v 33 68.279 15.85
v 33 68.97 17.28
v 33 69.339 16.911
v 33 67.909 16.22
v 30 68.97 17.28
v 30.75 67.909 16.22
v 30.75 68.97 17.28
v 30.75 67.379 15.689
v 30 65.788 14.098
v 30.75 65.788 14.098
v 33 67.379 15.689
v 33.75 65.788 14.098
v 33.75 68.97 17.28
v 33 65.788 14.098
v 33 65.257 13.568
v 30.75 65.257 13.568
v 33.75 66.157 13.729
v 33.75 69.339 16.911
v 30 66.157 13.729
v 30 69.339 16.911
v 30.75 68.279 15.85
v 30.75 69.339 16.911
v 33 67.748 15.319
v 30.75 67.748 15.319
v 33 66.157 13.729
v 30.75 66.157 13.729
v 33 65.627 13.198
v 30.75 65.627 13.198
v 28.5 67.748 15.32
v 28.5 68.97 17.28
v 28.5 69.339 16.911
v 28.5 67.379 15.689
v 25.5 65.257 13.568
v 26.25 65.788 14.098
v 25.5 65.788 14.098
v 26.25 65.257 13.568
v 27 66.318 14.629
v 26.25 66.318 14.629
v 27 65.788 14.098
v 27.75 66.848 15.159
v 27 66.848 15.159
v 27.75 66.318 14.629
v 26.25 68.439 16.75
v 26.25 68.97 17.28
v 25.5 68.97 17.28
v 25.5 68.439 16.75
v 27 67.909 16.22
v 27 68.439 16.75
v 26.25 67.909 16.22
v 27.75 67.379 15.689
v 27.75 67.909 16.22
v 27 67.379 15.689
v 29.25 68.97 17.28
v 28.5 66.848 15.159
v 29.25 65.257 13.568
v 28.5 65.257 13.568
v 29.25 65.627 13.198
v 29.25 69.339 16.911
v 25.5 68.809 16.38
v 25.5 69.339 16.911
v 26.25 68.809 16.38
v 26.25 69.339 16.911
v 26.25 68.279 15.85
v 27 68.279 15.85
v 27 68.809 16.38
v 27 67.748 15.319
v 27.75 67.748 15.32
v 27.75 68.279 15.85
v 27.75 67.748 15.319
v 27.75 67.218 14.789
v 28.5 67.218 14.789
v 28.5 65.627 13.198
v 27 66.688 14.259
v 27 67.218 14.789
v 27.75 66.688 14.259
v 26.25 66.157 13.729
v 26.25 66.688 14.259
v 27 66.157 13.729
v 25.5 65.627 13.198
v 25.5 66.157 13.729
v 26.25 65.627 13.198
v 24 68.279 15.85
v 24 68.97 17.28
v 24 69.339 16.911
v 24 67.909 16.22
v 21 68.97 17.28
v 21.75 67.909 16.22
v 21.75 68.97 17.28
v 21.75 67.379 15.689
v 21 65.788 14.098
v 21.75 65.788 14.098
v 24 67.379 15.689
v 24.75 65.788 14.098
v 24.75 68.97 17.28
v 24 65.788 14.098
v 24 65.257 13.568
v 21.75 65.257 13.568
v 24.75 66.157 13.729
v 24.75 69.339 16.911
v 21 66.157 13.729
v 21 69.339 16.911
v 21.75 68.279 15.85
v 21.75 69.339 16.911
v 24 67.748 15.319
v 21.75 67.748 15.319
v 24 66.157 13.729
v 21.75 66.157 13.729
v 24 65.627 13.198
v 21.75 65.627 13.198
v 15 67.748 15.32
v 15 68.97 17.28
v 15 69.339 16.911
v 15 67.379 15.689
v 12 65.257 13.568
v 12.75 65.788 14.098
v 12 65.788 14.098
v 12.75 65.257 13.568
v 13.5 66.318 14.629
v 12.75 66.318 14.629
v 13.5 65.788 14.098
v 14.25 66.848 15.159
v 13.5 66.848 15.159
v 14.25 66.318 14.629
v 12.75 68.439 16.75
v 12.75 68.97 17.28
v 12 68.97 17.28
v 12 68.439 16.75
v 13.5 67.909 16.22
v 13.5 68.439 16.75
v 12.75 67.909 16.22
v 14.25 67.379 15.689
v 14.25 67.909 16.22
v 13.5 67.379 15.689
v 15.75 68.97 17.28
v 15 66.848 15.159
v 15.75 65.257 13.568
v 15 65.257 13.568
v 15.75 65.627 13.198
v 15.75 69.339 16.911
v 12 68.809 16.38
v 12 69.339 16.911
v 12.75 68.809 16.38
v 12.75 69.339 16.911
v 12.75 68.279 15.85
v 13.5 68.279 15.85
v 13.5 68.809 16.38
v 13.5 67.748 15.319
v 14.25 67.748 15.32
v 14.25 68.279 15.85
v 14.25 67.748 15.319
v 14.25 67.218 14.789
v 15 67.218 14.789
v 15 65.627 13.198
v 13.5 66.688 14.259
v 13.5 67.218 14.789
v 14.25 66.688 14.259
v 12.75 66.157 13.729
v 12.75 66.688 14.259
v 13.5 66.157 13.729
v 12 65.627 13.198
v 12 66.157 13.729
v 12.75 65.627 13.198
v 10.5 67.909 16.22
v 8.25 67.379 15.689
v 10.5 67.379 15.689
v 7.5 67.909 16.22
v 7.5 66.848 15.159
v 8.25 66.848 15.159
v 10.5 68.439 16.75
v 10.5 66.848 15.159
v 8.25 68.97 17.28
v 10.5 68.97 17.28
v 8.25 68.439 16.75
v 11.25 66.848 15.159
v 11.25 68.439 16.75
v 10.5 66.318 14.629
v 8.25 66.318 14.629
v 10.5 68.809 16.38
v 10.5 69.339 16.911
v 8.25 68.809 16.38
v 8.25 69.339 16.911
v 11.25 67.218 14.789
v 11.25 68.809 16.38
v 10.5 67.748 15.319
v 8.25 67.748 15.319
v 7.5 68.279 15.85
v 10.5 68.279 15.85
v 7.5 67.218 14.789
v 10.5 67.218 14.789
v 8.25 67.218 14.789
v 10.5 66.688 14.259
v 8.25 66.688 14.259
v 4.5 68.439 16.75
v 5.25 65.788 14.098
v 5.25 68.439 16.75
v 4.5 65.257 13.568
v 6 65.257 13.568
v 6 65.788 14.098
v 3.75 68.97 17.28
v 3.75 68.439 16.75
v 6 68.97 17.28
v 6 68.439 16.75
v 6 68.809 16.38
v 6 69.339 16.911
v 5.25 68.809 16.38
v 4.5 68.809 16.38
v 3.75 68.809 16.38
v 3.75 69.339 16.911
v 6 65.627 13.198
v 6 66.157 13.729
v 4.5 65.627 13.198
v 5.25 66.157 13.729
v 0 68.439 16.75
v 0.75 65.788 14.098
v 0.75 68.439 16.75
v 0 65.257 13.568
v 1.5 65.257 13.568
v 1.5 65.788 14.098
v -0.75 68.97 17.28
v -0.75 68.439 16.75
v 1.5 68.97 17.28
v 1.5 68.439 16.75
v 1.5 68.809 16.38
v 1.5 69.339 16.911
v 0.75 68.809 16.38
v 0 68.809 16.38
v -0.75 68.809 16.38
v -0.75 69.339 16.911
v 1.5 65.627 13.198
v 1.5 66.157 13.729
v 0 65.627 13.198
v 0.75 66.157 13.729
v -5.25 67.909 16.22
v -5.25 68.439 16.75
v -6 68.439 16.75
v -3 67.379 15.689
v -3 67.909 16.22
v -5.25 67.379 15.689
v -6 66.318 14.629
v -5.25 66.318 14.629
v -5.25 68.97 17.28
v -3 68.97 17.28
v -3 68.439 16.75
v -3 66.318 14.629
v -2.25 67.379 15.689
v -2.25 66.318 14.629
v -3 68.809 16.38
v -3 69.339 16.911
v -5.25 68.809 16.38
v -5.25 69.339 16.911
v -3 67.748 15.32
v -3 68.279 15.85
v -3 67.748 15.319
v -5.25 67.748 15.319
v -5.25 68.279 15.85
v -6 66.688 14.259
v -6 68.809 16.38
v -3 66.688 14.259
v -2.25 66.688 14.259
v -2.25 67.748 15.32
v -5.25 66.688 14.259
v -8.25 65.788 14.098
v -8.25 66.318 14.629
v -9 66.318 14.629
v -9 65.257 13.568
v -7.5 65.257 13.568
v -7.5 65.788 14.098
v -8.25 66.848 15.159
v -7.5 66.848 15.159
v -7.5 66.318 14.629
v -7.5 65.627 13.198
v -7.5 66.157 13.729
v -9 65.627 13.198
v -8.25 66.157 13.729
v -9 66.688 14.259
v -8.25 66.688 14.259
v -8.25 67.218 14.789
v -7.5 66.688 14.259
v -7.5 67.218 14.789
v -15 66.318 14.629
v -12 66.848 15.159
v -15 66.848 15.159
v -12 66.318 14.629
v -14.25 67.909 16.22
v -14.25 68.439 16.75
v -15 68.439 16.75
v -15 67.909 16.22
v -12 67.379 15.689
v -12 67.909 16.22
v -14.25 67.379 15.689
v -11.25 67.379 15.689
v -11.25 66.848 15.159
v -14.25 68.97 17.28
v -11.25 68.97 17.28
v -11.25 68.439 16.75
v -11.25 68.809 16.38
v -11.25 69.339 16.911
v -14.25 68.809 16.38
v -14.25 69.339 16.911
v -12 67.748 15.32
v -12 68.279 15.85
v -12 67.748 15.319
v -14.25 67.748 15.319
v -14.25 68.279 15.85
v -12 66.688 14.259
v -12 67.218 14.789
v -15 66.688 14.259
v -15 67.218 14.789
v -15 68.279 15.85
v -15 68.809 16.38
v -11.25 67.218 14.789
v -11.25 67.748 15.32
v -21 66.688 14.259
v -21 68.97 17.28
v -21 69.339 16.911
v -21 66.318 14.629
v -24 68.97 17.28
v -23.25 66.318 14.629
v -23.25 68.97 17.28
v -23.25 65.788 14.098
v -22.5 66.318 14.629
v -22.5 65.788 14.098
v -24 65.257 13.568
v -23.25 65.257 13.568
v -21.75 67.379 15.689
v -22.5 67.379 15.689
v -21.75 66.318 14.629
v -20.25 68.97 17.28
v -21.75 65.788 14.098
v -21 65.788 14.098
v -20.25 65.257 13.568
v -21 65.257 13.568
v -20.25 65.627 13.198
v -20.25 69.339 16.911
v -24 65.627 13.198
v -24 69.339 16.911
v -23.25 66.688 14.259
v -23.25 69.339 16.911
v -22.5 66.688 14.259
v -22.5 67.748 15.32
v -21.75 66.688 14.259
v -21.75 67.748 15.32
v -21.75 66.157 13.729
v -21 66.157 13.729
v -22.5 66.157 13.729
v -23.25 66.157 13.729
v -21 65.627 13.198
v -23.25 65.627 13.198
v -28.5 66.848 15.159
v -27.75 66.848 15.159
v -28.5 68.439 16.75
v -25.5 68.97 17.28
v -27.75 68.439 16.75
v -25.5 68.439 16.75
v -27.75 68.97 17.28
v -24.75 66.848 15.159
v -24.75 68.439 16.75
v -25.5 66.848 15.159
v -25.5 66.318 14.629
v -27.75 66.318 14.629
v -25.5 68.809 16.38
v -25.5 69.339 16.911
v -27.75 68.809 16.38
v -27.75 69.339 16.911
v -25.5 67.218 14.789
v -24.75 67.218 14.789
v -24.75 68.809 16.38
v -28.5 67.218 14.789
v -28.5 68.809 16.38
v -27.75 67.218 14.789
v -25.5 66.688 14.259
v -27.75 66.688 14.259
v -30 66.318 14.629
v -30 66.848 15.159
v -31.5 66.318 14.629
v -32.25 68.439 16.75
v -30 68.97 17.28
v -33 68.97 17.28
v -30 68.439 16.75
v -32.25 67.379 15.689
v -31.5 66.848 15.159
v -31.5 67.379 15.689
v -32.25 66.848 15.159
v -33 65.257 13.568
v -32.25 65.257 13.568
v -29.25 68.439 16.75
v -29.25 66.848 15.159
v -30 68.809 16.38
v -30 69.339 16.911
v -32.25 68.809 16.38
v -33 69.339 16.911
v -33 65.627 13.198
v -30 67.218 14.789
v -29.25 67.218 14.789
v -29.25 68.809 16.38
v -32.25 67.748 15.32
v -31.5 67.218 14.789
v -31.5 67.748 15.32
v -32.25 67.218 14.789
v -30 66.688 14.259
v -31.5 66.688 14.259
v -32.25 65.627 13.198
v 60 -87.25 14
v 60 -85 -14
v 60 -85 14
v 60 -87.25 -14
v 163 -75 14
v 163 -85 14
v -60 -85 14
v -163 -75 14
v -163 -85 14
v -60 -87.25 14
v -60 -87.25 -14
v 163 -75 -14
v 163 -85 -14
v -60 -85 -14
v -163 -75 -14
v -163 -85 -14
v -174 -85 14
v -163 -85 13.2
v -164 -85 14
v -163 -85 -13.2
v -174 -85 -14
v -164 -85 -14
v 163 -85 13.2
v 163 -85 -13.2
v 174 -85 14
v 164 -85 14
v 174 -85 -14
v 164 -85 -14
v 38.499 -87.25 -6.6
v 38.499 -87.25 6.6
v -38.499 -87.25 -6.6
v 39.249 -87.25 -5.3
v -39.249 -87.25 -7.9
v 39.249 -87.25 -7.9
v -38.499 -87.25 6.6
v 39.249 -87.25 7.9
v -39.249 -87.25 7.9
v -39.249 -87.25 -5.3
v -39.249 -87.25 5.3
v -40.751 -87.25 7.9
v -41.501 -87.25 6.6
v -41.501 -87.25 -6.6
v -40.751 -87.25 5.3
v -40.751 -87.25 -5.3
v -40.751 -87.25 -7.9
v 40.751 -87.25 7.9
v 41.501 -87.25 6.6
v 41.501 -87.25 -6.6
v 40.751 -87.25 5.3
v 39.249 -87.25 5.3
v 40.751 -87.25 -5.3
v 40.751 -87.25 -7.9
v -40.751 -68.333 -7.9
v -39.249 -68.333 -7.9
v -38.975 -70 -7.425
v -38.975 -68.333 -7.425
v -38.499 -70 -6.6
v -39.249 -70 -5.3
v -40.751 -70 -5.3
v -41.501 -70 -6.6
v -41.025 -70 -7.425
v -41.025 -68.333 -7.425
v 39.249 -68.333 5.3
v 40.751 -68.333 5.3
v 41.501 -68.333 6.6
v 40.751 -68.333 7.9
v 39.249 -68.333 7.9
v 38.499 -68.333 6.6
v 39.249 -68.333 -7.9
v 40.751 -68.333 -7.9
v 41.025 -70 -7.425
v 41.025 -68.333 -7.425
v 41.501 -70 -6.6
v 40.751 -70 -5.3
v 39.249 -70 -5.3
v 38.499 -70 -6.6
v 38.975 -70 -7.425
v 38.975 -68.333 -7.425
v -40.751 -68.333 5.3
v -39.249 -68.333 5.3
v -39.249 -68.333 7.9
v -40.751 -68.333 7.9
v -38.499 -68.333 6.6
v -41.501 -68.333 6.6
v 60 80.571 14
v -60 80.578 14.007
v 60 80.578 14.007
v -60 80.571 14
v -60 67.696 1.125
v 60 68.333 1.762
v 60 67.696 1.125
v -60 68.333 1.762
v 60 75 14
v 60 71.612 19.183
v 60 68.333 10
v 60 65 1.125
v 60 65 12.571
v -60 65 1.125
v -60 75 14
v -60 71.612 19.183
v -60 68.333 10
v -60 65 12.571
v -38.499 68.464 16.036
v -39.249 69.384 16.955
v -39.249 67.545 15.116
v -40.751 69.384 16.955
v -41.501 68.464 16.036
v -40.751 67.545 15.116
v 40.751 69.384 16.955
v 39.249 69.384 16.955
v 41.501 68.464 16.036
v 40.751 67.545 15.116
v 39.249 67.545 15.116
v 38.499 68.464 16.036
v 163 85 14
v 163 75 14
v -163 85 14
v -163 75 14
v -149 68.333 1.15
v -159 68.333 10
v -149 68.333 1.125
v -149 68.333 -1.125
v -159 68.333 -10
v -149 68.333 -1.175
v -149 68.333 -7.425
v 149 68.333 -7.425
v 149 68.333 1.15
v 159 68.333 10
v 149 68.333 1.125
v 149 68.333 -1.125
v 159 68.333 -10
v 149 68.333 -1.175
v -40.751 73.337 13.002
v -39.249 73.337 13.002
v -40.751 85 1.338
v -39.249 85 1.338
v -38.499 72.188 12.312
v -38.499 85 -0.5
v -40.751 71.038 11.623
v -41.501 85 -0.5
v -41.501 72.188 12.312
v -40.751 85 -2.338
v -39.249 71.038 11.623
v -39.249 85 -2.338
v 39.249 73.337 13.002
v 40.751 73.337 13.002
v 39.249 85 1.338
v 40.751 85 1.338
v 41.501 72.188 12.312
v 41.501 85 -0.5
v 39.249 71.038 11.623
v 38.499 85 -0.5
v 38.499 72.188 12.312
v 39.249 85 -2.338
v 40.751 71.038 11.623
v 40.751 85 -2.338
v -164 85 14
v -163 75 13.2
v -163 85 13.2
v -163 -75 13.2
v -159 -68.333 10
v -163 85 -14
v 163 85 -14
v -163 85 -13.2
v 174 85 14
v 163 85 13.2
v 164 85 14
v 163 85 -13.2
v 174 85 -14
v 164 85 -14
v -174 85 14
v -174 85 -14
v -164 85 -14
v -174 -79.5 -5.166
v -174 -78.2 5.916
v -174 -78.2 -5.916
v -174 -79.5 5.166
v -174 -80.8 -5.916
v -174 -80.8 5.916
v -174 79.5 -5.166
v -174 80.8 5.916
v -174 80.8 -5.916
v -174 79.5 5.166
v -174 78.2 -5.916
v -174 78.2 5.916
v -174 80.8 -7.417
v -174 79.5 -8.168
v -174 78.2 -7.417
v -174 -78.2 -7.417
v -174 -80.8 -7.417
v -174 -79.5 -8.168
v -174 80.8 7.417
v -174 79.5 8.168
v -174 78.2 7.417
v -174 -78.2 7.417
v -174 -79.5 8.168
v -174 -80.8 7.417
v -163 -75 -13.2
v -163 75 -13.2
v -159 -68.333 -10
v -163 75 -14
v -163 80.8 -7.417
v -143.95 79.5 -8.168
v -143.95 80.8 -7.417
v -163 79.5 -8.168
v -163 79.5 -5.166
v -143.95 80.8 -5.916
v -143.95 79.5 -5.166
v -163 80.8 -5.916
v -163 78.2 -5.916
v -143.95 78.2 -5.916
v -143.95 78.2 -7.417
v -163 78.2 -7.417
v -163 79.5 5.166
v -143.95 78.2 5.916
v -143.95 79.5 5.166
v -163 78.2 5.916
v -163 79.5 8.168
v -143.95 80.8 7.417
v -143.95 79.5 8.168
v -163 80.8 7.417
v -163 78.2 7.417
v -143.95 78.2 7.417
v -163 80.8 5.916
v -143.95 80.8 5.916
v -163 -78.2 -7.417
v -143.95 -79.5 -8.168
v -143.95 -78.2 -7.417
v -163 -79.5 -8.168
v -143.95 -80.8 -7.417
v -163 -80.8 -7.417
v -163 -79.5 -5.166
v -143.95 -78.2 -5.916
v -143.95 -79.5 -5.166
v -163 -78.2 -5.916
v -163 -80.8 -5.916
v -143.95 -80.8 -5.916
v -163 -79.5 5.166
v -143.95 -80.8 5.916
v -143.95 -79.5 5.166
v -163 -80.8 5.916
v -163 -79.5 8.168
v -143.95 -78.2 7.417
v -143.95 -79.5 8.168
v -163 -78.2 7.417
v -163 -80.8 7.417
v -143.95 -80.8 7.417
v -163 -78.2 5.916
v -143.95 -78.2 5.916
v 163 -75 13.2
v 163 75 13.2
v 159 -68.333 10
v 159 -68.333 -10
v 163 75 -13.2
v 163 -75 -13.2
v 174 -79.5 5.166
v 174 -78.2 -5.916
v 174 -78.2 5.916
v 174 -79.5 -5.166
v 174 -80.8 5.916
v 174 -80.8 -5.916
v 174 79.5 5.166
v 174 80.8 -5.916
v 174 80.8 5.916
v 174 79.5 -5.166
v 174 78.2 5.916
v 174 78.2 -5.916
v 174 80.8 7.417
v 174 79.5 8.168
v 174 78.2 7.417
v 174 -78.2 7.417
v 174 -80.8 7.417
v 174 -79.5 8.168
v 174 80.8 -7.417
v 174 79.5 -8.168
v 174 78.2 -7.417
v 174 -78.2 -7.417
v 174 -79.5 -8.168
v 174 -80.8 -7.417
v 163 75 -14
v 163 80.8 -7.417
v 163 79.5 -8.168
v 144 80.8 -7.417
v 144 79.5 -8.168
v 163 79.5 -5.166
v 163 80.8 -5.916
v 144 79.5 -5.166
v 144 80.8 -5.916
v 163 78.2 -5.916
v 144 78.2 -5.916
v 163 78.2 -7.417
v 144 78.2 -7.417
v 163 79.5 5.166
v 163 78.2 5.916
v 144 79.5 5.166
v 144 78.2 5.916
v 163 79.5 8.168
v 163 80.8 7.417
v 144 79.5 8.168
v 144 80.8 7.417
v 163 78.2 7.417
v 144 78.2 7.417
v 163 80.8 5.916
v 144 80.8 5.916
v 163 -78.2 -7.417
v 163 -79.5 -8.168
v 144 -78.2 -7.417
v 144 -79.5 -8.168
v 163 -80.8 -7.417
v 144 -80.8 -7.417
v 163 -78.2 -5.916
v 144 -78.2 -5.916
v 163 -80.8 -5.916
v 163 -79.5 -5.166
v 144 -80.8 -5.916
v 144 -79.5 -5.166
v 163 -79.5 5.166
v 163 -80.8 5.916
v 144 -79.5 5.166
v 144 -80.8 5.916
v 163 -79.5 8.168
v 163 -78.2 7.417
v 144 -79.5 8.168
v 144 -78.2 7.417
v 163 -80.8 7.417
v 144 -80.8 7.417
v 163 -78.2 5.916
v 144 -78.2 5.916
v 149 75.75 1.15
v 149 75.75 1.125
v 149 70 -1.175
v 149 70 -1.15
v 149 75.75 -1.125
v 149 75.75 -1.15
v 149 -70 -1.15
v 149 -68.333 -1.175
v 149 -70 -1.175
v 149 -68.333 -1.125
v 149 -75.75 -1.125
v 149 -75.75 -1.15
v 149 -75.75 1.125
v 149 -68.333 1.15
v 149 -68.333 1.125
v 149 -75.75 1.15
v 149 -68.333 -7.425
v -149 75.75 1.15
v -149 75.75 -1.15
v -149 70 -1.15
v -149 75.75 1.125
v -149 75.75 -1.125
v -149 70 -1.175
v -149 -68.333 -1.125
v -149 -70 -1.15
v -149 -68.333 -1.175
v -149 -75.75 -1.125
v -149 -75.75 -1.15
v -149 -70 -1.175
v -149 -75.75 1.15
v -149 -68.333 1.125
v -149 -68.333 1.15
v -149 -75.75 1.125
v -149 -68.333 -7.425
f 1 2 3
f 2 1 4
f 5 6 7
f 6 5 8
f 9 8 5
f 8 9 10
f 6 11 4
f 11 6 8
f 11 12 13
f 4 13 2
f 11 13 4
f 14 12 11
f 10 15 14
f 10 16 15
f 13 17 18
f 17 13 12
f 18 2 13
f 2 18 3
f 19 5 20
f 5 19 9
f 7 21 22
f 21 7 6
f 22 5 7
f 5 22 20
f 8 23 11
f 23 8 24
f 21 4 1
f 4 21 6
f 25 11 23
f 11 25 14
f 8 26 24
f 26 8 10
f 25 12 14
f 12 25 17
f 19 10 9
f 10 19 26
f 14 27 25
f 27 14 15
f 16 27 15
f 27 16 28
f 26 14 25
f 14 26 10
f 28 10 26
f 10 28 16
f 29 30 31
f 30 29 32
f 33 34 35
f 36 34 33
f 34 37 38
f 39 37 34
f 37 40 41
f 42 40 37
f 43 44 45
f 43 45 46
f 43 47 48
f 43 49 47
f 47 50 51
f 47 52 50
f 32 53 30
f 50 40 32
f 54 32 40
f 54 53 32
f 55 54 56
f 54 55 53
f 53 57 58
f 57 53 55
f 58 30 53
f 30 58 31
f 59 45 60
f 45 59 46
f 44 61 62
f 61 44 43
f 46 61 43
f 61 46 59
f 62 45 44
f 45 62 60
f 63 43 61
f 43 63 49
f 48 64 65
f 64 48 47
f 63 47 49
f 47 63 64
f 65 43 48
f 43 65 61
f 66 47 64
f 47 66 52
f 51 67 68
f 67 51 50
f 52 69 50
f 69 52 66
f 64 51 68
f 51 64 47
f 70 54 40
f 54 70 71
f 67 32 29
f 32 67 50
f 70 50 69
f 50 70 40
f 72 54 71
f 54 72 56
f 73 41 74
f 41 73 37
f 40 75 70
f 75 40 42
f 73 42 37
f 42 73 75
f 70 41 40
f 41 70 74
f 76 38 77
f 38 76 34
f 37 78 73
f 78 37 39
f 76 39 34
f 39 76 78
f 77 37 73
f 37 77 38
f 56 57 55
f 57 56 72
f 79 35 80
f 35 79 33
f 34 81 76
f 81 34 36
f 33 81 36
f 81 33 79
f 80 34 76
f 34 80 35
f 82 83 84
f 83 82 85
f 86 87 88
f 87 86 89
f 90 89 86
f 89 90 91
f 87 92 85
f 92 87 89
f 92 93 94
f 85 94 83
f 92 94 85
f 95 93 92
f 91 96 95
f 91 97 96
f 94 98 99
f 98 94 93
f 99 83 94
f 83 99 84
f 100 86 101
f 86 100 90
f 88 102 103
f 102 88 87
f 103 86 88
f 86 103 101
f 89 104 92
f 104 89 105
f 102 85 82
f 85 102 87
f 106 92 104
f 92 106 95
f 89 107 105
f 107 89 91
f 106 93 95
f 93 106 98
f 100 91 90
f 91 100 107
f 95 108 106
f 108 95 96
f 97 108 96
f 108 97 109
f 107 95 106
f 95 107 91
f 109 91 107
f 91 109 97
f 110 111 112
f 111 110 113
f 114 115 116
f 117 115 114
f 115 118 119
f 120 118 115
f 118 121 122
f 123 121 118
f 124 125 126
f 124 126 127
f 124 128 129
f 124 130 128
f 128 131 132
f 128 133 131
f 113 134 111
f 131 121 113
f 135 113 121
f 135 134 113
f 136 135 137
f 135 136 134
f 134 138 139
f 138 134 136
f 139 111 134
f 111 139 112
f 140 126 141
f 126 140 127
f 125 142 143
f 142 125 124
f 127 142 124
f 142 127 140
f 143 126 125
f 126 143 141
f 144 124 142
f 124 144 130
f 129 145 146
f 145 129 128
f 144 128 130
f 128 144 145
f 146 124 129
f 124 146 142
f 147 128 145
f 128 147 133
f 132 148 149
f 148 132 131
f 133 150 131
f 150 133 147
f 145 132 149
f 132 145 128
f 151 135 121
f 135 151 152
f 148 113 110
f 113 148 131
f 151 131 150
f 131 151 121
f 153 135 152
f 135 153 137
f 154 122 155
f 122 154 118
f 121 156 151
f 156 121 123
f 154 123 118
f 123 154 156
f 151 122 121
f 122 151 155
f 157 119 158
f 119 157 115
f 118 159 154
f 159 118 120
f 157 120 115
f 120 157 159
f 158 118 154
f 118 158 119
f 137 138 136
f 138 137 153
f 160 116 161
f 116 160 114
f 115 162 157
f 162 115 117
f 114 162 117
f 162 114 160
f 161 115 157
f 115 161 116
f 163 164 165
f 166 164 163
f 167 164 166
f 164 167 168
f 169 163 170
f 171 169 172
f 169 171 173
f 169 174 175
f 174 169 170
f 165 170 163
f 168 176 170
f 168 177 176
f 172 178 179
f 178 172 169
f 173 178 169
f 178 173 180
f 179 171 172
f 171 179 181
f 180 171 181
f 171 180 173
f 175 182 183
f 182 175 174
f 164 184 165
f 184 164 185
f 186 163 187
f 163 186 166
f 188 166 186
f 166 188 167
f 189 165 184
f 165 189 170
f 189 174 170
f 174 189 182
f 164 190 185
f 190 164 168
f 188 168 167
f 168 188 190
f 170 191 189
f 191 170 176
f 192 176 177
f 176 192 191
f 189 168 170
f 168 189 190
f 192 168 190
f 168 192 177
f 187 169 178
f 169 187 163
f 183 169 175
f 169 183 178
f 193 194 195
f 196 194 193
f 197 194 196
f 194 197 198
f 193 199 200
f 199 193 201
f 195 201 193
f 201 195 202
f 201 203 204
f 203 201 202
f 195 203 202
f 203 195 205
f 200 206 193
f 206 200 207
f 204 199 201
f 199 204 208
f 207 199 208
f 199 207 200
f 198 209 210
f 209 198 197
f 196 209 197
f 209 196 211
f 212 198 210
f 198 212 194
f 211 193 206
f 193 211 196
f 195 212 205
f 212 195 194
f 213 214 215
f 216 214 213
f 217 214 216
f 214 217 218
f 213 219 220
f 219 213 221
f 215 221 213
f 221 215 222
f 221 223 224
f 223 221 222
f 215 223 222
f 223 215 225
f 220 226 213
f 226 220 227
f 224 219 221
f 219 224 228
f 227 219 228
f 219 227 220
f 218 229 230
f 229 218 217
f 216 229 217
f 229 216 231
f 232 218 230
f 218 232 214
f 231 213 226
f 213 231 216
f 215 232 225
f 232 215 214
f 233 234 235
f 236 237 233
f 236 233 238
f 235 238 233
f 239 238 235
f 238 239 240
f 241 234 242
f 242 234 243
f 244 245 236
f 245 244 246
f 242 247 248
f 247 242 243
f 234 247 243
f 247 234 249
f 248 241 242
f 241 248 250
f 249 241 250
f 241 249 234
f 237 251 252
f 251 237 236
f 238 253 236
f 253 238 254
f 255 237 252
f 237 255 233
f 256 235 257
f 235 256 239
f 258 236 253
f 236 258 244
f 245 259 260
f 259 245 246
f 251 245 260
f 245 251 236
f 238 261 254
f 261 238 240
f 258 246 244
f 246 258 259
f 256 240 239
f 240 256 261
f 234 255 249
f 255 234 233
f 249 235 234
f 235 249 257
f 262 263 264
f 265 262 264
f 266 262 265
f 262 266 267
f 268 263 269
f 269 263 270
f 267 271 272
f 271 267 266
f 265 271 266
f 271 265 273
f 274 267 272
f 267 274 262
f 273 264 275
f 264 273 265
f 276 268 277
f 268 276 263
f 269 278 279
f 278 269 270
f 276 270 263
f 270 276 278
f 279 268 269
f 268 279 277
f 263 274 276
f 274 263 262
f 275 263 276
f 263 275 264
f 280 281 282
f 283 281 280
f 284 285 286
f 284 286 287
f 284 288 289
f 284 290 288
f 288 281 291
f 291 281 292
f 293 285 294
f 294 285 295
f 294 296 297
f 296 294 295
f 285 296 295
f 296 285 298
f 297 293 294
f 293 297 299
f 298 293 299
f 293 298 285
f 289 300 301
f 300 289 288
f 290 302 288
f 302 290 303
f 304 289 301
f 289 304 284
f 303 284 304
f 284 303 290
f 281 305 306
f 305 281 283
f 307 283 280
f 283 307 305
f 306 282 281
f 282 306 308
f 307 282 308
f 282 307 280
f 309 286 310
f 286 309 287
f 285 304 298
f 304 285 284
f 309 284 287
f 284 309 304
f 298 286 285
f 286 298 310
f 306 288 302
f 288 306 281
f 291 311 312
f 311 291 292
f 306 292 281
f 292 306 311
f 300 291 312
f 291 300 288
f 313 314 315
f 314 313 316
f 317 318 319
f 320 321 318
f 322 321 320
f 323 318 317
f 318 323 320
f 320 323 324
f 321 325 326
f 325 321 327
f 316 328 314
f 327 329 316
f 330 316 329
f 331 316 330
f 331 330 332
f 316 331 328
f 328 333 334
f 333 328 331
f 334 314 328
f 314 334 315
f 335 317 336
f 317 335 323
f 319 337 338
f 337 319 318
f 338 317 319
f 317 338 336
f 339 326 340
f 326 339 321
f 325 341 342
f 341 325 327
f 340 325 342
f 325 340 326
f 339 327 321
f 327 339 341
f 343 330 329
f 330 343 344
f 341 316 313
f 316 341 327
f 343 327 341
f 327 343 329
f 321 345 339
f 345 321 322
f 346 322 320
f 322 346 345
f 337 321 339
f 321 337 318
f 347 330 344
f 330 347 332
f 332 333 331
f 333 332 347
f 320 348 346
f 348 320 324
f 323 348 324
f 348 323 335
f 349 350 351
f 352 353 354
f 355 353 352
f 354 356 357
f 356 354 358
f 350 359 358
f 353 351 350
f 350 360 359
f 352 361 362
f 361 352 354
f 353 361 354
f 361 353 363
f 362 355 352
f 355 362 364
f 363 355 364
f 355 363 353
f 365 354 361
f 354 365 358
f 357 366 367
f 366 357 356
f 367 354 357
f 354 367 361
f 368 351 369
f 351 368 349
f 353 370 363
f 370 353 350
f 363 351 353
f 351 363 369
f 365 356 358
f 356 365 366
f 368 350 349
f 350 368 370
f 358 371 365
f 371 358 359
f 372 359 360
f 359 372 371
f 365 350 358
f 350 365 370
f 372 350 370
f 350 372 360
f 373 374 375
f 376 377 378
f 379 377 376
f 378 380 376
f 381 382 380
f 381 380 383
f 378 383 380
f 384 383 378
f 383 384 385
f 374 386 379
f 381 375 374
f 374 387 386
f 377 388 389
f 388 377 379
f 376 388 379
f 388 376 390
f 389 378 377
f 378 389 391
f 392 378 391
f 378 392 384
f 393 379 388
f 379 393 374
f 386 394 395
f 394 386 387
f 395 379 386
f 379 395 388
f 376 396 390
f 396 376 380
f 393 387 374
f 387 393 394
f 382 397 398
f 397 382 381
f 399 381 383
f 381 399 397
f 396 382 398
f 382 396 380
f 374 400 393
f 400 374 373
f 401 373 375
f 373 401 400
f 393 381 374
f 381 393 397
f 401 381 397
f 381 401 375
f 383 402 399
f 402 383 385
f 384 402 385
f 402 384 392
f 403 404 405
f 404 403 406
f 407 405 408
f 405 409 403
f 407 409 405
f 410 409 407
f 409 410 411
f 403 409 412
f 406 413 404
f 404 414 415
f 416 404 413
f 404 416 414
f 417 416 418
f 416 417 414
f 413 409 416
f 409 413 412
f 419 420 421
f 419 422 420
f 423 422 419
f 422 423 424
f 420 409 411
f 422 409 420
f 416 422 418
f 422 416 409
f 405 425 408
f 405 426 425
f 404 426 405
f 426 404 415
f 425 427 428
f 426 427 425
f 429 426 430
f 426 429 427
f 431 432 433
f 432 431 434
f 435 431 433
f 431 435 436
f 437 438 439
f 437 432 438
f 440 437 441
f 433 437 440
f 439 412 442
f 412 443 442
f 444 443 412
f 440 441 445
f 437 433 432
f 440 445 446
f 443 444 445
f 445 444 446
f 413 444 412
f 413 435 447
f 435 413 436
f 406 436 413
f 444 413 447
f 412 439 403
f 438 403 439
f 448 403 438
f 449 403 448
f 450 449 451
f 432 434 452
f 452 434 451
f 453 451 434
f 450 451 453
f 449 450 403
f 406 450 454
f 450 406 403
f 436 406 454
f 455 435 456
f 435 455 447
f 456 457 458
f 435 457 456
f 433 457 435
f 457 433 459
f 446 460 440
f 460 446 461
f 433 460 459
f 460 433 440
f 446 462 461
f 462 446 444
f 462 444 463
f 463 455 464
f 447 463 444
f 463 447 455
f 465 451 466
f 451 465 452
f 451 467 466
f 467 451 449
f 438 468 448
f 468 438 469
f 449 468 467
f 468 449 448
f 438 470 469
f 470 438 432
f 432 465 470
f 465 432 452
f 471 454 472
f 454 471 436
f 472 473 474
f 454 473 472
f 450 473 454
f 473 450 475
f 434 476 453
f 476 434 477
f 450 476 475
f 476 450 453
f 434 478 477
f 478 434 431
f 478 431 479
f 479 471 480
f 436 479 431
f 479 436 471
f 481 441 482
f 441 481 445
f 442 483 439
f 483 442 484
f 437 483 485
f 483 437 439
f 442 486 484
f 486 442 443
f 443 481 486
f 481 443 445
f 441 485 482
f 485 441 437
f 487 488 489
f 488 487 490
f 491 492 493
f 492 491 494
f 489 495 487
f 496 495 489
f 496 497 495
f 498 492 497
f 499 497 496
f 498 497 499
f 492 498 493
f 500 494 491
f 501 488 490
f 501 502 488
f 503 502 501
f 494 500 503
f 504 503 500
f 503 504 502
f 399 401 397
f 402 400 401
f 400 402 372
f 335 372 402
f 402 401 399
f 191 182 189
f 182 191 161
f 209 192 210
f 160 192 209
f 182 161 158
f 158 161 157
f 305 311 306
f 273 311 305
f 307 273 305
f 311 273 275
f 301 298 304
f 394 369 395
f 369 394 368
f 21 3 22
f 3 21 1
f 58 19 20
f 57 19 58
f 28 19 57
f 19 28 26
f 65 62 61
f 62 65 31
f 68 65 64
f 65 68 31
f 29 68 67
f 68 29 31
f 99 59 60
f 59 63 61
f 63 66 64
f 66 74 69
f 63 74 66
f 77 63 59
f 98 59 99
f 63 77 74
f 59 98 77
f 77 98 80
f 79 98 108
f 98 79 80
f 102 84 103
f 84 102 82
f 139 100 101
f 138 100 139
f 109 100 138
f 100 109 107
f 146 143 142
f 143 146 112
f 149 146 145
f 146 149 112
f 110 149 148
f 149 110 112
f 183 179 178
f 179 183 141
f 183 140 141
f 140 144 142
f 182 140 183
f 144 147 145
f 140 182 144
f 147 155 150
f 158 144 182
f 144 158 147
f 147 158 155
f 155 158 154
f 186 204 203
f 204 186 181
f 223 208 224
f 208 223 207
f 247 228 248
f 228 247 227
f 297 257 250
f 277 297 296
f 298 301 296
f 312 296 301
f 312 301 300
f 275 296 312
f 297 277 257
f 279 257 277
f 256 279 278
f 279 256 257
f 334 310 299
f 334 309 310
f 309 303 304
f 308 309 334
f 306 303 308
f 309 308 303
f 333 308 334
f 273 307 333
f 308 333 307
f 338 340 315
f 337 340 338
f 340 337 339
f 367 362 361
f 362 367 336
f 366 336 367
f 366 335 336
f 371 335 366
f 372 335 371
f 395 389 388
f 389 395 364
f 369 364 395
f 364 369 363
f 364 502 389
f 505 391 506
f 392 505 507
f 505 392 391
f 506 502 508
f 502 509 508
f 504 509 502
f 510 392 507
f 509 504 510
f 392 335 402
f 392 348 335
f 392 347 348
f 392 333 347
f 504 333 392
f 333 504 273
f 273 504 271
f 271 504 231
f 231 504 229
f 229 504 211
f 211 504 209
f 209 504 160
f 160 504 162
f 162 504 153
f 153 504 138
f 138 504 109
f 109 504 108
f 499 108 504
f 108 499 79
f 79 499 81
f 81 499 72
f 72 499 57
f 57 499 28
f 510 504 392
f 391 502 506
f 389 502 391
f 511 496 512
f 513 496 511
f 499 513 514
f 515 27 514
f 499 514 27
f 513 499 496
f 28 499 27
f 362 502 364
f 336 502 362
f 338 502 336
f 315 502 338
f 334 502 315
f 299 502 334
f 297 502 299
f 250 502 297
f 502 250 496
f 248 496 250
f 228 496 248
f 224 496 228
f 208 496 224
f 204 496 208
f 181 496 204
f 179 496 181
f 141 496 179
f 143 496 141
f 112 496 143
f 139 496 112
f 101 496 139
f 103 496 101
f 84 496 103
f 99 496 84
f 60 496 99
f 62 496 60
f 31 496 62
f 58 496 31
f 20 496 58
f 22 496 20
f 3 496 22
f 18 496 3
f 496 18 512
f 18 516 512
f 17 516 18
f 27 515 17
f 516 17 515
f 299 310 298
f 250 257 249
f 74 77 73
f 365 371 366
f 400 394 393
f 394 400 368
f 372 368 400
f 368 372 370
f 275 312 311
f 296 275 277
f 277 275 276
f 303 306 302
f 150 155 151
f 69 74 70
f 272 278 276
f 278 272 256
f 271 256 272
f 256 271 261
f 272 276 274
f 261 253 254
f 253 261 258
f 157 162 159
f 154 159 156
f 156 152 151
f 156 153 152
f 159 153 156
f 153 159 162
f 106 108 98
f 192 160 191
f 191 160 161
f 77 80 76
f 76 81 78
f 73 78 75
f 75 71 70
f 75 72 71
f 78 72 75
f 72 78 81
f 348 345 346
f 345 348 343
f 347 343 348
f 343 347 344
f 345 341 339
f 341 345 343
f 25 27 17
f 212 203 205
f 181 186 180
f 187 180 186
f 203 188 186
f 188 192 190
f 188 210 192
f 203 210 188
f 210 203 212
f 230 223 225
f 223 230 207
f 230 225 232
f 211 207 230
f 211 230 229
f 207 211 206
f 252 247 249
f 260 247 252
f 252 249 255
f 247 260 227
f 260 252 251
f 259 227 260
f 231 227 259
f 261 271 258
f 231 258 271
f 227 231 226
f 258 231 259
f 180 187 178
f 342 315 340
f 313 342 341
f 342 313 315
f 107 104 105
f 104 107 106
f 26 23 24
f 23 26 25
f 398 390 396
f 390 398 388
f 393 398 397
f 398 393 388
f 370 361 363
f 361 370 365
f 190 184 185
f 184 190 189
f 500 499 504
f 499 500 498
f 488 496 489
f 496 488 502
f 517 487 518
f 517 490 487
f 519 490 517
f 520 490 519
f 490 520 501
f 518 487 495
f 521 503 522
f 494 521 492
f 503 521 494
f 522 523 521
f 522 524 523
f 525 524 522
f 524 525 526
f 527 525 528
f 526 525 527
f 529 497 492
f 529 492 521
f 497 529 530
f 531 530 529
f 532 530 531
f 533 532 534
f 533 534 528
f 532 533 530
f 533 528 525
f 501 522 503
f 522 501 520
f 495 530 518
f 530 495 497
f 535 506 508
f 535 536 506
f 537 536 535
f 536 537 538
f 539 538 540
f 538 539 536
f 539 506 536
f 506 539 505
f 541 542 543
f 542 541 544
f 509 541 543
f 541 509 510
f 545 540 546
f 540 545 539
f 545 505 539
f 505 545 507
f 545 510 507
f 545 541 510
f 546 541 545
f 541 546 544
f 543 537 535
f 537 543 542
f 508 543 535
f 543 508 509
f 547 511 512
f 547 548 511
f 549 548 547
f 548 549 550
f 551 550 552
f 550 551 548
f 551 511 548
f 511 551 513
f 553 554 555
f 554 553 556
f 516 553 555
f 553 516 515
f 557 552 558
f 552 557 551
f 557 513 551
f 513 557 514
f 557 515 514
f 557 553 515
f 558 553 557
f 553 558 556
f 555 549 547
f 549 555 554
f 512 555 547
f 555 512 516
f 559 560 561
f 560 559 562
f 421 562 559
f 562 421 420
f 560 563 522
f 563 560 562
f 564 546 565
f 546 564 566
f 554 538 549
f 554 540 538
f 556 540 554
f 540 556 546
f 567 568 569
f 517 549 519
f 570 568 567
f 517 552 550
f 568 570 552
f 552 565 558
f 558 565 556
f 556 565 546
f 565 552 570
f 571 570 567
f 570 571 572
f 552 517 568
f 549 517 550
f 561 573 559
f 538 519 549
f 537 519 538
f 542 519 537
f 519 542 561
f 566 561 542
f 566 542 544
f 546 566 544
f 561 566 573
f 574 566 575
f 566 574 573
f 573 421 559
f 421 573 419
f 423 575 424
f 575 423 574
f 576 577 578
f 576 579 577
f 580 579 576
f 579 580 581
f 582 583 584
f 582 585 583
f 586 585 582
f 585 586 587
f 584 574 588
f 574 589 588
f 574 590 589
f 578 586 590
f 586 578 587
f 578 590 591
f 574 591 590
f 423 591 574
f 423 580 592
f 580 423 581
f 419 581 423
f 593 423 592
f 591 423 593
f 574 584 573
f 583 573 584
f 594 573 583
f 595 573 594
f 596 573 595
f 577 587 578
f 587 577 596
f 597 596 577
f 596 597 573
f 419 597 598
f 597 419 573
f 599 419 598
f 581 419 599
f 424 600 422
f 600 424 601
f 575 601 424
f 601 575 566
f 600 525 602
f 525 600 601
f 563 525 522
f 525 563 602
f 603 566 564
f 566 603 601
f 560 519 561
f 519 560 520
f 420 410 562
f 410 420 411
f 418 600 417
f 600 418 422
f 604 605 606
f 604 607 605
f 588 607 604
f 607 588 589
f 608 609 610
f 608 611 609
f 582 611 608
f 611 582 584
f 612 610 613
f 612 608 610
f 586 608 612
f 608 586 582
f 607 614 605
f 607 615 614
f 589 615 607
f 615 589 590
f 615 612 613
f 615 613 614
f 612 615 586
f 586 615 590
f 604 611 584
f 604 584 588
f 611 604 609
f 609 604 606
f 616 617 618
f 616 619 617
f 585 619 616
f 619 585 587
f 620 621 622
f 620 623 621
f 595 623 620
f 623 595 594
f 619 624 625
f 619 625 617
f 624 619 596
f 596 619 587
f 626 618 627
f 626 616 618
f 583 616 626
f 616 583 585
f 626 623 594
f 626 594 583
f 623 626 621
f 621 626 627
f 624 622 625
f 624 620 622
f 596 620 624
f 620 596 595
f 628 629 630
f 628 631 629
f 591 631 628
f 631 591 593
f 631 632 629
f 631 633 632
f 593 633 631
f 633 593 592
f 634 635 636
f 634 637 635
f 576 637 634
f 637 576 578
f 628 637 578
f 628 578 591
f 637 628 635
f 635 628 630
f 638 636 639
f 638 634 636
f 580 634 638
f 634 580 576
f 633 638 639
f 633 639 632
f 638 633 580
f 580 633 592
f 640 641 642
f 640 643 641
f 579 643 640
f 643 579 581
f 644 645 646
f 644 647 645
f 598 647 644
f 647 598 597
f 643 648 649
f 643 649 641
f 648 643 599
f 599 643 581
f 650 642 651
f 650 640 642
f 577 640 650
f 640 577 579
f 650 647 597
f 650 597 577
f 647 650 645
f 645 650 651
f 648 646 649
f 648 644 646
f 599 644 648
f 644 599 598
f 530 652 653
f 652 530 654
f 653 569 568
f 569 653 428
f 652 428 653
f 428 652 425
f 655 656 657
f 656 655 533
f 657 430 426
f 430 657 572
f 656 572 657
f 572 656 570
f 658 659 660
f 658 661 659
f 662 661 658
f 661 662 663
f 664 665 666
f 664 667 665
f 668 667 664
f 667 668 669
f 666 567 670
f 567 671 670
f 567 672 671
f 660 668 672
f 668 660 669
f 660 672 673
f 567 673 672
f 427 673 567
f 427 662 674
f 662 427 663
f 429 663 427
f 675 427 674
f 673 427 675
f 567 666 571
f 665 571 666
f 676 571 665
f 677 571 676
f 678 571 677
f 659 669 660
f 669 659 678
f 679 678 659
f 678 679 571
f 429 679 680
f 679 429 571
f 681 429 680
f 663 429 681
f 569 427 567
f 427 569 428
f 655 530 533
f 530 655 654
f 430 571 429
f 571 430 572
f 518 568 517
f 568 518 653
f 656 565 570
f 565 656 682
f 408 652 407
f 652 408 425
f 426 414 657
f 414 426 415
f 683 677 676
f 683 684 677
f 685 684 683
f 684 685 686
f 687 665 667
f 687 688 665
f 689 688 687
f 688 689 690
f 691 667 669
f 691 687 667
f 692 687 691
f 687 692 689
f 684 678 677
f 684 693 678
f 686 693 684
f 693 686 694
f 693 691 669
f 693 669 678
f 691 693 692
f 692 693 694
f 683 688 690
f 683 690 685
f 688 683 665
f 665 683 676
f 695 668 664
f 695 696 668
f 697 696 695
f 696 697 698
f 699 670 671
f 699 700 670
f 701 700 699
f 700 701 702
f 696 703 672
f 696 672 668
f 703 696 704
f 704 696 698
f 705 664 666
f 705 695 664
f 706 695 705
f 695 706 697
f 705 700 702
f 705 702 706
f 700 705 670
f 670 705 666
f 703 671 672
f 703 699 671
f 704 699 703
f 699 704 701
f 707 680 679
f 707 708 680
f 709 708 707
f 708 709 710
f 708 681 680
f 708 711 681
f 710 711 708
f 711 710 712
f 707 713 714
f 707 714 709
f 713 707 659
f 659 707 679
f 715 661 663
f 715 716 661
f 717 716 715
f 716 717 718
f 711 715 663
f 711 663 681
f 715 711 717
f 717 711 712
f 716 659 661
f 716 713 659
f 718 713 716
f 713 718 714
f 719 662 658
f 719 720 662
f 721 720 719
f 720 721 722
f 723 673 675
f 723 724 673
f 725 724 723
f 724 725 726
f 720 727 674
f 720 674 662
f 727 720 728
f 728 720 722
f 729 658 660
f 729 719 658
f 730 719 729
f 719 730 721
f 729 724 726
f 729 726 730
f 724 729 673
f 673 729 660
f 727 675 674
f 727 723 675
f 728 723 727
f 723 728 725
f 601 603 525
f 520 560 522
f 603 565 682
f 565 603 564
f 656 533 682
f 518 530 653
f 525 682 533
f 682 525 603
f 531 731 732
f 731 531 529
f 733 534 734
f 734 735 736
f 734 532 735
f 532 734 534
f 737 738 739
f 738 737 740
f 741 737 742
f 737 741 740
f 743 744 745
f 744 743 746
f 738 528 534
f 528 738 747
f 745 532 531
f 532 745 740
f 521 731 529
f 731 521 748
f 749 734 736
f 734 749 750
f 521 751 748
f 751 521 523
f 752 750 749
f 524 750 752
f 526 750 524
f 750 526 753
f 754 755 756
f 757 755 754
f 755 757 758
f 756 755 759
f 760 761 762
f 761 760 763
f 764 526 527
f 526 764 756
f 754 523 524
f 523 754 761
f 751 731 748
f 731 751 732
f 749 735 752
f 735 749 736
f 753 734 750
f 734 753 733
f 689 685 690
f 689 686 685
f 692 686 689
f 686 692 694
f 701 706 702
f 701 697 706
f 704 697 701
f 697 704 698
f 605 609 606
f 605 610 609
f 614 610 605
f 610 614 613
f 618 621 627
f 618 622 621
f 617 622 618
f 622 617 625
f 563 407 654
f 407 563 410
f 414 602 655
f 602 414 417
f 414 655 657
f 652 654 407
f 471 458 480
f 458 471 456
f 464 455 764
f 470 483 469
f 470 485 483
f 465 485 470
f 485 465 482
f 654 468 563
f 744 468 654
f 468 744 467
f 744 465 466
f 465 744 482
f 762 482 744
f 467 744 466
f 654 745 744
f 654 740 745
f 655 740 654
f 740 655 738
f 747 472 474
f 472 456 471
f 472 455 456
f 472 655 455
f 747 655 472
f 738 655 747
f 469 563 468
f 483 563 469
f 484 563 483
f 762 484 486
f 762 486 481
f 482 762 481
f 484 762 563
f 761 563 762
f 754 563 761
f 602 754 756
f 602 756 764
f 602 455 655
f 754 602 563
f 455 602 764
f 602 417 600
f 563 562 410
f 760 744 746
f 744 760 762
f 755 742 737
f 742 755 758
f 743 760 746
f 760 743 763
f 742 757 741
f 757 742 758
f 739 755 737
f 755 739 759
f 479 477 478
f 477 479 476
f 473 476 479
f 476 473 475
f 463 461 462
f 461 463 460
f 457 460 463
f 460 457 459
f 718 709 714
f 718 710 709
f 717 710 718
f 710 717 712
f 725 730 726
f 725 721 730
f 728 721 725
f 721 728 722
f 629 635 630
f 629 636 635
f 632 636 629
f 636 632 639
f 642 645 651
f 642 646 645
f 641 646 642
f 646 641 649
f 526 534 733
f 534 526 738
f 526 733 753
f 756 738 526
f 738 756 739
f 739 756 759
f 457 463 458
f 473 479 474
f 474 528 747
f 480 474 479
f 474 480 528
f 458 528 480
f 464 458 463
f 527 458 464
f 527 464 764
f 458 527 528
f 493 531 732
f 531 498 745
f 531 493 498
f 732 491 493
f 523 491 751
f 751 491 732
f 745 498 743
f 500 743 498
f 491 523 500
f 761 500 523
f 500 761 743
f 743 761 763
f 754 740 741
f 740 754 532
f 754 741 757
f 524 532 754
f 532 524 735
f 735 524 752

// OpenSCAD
//How thick the backing for the display is
backingThickness=6.25;
//How tall the backing is
backingHeight=140;
//How wide the backing is, should be the same width as the plexiglass
backingWidth=298;
//How thick the Plexiglass you are working with is
plexiThickness=2.25;
//How tall the Plexiglass is
plexiHeight=151.5;
plexiWidth=backingWidth;
// Hole creation offset for bolt holes and such
holeCreationOffset=0.05;
//The size of the text on the object
textSize=.75;//[.5,.75,1]
//The text to display on the fliplock
locktext="AKA Kelly's Mod";
//How wide the faceplate is
facePlateWidth=120;
//How thick the base is
baseThickness=10;
//How tall the base is
baseHeight=20;
//The base offset size, this will affect the shouldered areas
baseOffset=8;
//How large the holes are, make it smaller then the screw radius to ensure self threading
boltHolesRadius=1.3;
//How long the hole for the bolts are
boltHoleLength=20;
//Howe large the bolthead is in height
screwHeadHeight=2.5;
//The radius of the bolthead
screwHeadRadius=2.8;
fakePlexi=true; //[true:false]
fakeBacking=true; //[true:false]
enableBracket=true; //[true:false]
enableBase=true; //[true:false]
enableBaseLeftSide=true; //[true:false]
enableBaseRightSide=true; //[true:false]
enableTop=true; //[true:false]
enableText=true; //[true:false]
enableScrewHoles=true; //[true:false]
enableFacePlate=true; //[true:false]
enableTopPlate=true; //[true:false]

 
module cylinder_outer(height,radius,fn){
   fudge = 1/cos(180/fn);
   cylinder(h=height,r=radius*fudge,$fn=fn);}
   
module cylinder_mid(height,radius,fn){
   fudge = (1+1/cos(180/fn))/2;
   cylinder(h=height,r=radius*fudge,$fn=fn);}
   
module holder(){
    stringlen=len(locktext);
    testlength=stringlen *textSize;
    //How wide the base is
    baseWidth=(backingWidth/2) + 10;
    overallThickness=backingThickness + plexiThickness;
    bracketThickness=((baseWidth * 2) - backingWidth) /2;
    bracketHeight=baseHeight;
    bracketWidth=(baseThickness * 3) + backingHeight;
    bracketOffset=bracketThickness/2;

        if (enableText){
             translate([testlength * 3 , baseWidth/2 - (baseThickness ) , baseThickness * 2 - (baseOffset/2) + (textSize )]) rotate(a=[-45,0,180])  scale([textSize,textSize,textSize]) drawtext(locktext);
        }
    
    
        if (enableTopPlate){
            difference(){
                translate([0, -bracketWidth/2 - (plexiThickness/2), 0]) cube([facePlateWidth, plexiThickness, baseHeight + baseOffset], center=true);
                translate([-(facePlateWidth / 3 ), -bracketWidth/2 + (boltHoleLength), -(baseHeight ) * .33]) rotate(a=[90,0,0]) cylinder_outer(boltHoleLength* 3 + holeCreationOffset,boltHolesRadius,6);
                translate([(facePlateWidth / 3 ), -bracketWidth/2 + (boltHoleLength), (baseHeight )  * .33]) rotate(a=[90,0,0]) cylinder_outer(boltHoleLength* 3 + holeCreationOffset,boltHolesRadius,6);

                translate([(facePlateWidth / 3 ), -bracketWidth/2 + (boltHoleLength), -(baseHeight ) * .33]) rotate(a=[90,0,0]) cylinder_outer(boltHoleLength* 3 + holeCreationOffset,boltHolesRadius,6);
                translate([-(facePlateWidth / 3 ), -bracketWidth/2 + (boltHoleLength), (baseHeight )  * .33]) rotate(a=[90,0,0]) cylinder_outer(boltHoleLength* 3 + holeCreationOffset,boltHolesRadius,6);
            }
    
        }
    

        if (enableFacePlate){
            difference(){
                translate([0, baseWidth/2, baseThickness * 2]) rotate(a=[-45,0,0])cube([facePlateWidth, baseThickness, 60], center=true);
                translate([0, 0, -50 ]) cube([plexiWidth, plexiHeight, 100], center=true);
                translate([0, 45, 0 ]) cube([plexiWidth, 40, 40], center=true);
                translate([0, bracketWidth/2.25, 40 ]) rotate(a=[60,0,0]) cube([plexiWidth, 40, 80], center=true);
                hull(){
                    translate([0, (backingHeight/2) + (baseThickness/3) , 0 ]) cube([baseWidth ,baseThickness , baseHeight], center=true);
                    translate([0, (backingHeight/2) + (baseThickness) , 0 ]) cube([baseWidth + baseOffset ,baseThickness , baseHeight + baseOffset], center=true);
                    }
    translate([-(facePlateWidth / 3 ), baseWidth/2 + baseThickness , -baseThickness/2  ]) rotate(a=[45,0,0]) cylinder_outer(boltHoleLength * 3 + holeCreationOffset,boltHolesRadius,6);
    translate([(facePlateWidth / 3 ), baseWidth/2 + baseThickness , -baseThickness/2 ]) rotate(a=[45,0,0]) cylinder_outer(boltHoleLength* 3 + holeCreationOffset,boltHolesRadius,6);
            }
        }
        
        if (fakeBacking){
            color([1,1,0]) translate([0, 0, -backingThickness - holeCreationOffset + (plexiThickness) - .25]) cube([backingWidth, backingHeight, backingThickness], center=true);
            
            }
        if (fakePlexi){
            color([1,0,1]) translate([0, 0, 0 ]) cube([plexiWidth, plexiHeight, plexiThickness], center=true);
            }

        if (enableBracket){
            difference(){
            hull() union() {
            translate([-baseWidth - bracketOffset , 0, 0]) cube([ bracketThickness, bracketWidth, bracketHeight], center=true);
            translate([-baseWidth - (bracketThickness /2) - bracketOffset, 0, 0]) cube([ bracketThickness, bracketWidth, bracketHeight + baseOffset], center=true);
            }
            hull() {
            translate([-baseWidth/2, (backingHeight/2) + (baseThickness/2) , 0 ]) cube([baseWidth ,baseThickness , baseHeight], center=true);
            translate([baseWidth/2, (backingHeight/2) + (baseThickness/2), 0 ]) cube([baseWidth ,baseThickness , baseHeight], center=true);
            translate([-baseWidth/2, (backingHeight/2) + (baseThickness) , 0 ]) cube([baseWidth + baseOffset ,baseThickness , baseHeight + baseOffset], center=true);
            translate([baseWidth/2, (backingHeight/2) + (baseThickness), 0 ]) cube([baseWidth + baseOffset ,baseThickness , baseHeight + baseOffset], center=true);

                }
                
            hull() {
            translate([baseWidth/2, -(backingHeight/2) - (baseThickness/2) , 0 ]) cube([baseWidth ,baseThickness , baseHeight], center=true);
            translate([-baseWidth/2, -(backingHeight/2) - (baseThickness/2), 0 ]) cube([baseWidth ,baseThickness , baseHeight], center=true);
            translate([baseWidth/2, -(backingHeight/2) - (baseThickness) , 0 ]) cube([baseWidth + baseOffset ,baseThickness , baseHeight + baseOffset], center=true);
            translate([-baseWidth/2, -(backingHeight/2) - (baseThickness), 0 ]) cube([baseWidth + baseOffset ,baseThickness , baseHeight + baseOffset], center=true);
            
                }
                
            rotate(a=[0,90,0]) translate([(baseHeight / 3), baseWidth/2, -baseWidth - boltHoleLength ]) cylinder_outer(boltHoleLength + holeCreationOffset,boltHolesRadius,6);
            rotate(a=[0,90,0]) translate([-(baseHeight / 3), baseWidth/2, -baseWidth - boltHoleLength ]) cylinder_outer(boltHoleLength + holeCreationOffset,boltHolesRadius,6);
            rotate(a=[0,90,0]) translate([(baseHeight / 3), -baseWidth/2, -baseWidth - boltHoleLength ]) cylinder_outer(boltHoleLength + holeCreationOffset,boltHolesRadius,6);
            rotate(a=[0,90,0]) translate([-(baseHeight / 3), -baseWidth/2, -baseWidth - boltHoleLength ]) cylinder_outer(boltHoleLength + holeCreationOffset,boltHolesRadius,6);
        }
        difference(){
                hull() union() {
            translate([baseWidth + bracketOffset, 0, 0]) cube([ bracketThickness, bracketWidth, bracketHeight], center=true);
            translate([baseWidth  + (bracketThickness /2) + bracketOffset, 0, 0]) cube([ bracketThickness, bracketWidth, bracketHeight + baseOffset], center=true);
                }
                hull() union() {
            translate([-baseWidth/2, (backingHeight/2) + (baseThickness/2) , 0 ]) cube([baseWidth ,baseThickness , baseHeight], center=true);
            translate([baseWidth/2, (backingHeight/2) + (baseThickness/2), 0 ]) cube([baseWidth ,baseThickness , baseHeight], center=true);
            translate([-baseWidth/2, (backingHeight/2) + (baseThickness) , 0 ]) cube([baseWidth + baseOffset ,baseThickness , baseHeight + baseOffset], center=true);
            translate([baseWidth/2, (backingHeight/2) + (baseThickness), 0 ]) cube([baseWidth + baseOffset ,baseThickness , baseHeight + baseOffset], center=true);
                                            
                }
                
                hull() union() {
            translate([baseWidth/2, -(backingHeight/2) - (baseThickness/2) , 0 ]) cube([baseWidth ,baseThickness , baseHeight], center=true);
            translate([-baseWidth/2, -(backingHeight/2) - (baseThickness/2), 0 ]) cube([baseWidth ,baseThickness , baseHeight], center=true);
            translate([baseWidth/2, -(backingHeight/2) - (baseThickness) , 0 ]) cube([baseWidth + baseOffset ,baseThickness , baseHeight + baseOffset], center=true);
            translate([-baseWidth/2, -(backingHeight/2) - (baseThickness), 0 ]) cube([baseWidth + baseOffset ,baseThickness , baseHeight + baseOffset], center=true);
            
                }
                
                rotate(a=[0,90,0]) translate([(baseHeight / 3), baseWidth/2, baseWidth ]) cylinder_outer(boltHoleLength + holeCreationOffset,boltHolesRadius,6);
                rotate(a=[0,90,0]) translate([-(baseHeight / 3), baseWidth/2, baseWidth ]) cylinder_outer(boltHoleLength + holeCreationOffset,boltHolesRadius,6);
                rotate(a=[0,90,0]) translate([(baseHeight / 3), -baseWidth/2, baseWidth ]) cylinder_outer(boltHoleLength + holeCreationOffset,boltHolesRadius,6);
                rotate(a=[0,90,0]) translate([-(baseHeight / 3), -baseWidth/2, baseWidth ]) cylinder_outer(boltHoleLength + holeCreationOffset,boltHolesRadius,6);
            }
        }   
        if (enableBase){
            
            difference(){
            hull() union() {
                if (enableBaseLeftSide){
            translate([-baseWidth/2, (backingHeight/2) + (baseThickness/3) , 0 ]) cube([baseWidth ,baseThickness , baseHeight], center=true);
                                translate([-baseWidth/2, (backingHeight/2) + (baseThickness) , 0 ]) cube([baseWidth + baseOffset ,baseThickness , baseHeight + baseOffset], center=true);
                    
                        

                }
                if (enableBaseRightSide){

            translate([baseWidth/2, (backingHeight/2) + (baseThickness), 0 ]) cube([baseWidth + baseOffset ,baseThickness , baseHeight + baseOffset], center=true);
                                translate([baseWidth/2, (backingHeight/2) + (baseThickness/3), 0 ]) cube([baseWidth ,baseThickness , baseHeight], center=true);

                }
                }
               cube([plexiWidth, plexiHeight, plexiThickness + holeCreationOffset], center=true); 
               translate([0, 0, -backingThickness  + (plexiThickness) - .25]) cube([backingWidth, backingHeight, backingThickness + holeCreationOffset], center=true);
            
                rotate(a=[0,90,0]) translate([(baseHeight / 3), baseWidth/2, baseWidth - (baseThickness * 1.5)]) cylinder_outer(boltHoleLength + holeCreationOffset,boltHolesRadius,6);
                rotate(a=[0,90,0]) translate([-(baseHeight / 3), baseWidth/2, baseWidth - (baseThickness * 1.5) ]) cylinder_outer(boltHoleLength + holeCreationOffset,boltHolesRadius,6);


                rotate(a=[0,90,0]) translate([(baseHeight / 3), baseWidth/2, -baseWidth - (boltHoleLength/4) ]) cylinder_outer(boltHoleLength + holeCreationOffset,boltHolesRadius,6);
                rotate(a=[0,90,0]) translate([-(baseHeight / 3), baseWidth/2, -baseWidth - (boltHoleLength/4) ]) cylinder_outer(boltHoleLength + holeCreationOffset,boltHolesRadius,6);

                translate([-(facePlateWidth / 3 ), baseWidth/2 + baseThickness , -baseThickness/2  ]) rotate(a=[45,0,0]) cylinder_outer(boltHoleLength * 3 + holeCreationOffset,boltHolesRadius,6);
                translate([(facePlateWidth / 3 ), baseWidth/2 + baseThickness , -baseThickness/2 ]) rotate(a=[45,0,0]) cylinder_outer(boltHoleLength* 3 + holeCreationOffset,boltHolesRadius,6);

                
                }
            } 
          
        if (enableTop){
            difference(){
            hull() union() {
                if (enableBaseRightSide){
            translate([baseWidth/2, -(backingHeight/2) - (baseThickness/3) , 0 ]) cube([baseWidth ,baseThickness , baseHeight], center=true);
                        translate([baseWidth/2, -(backingHeight/2) - (baseThickness) , 0 ]) cube([baseWidth + baseOffset ,baseThickness , baseHeight + baseOffset], center=true);
                    }
            if (enableBaseLeftSide){

            translate([-baseWidth/2, -(backingHeight/2) - (baseThickness), 0 ]) cube([baseWidth + baseOffset ,baseThickness , baseHeight + baseOffset], center=true);
                translate([-baseWidth/2, -(backingHeight/2) - (baseThickness/3), 0 ]) cube([baseWidth ,baseThickness , baseHeight], center=true);
            }
            
                }
                cube([plexiWidth, plexiHeight, plexiThickness + holeCreationOffset], center=true); 
                translate([0, 0, -backingThickness  + (plexiThickness) - .25]) cube([backingWidth, backingHeight, backingThickness + holeCreationOffset], center=true);

                rotate(a=[0,90,0]) translate([(baseHeight / 3), -baseWidth/2, baseWidth - (baseThickness * 1.5) ]) cylinder_outer(boltHoleLength + holeCreationOffset,boltHolesRadius,6);
                rotate(a=[0,90,0]) translate([-(baseHeight / 3), -baseWidth/2, baseWidth - (baseThickness * 1.5) ]) cylinder_outer(boltHoleLength + holeCreationOffset,boltHolesRadius,6);
                rotate(a=[0,90,0]) translate([(baseHeight / 3), -baseWidth/2, -baseWidth - (boltHoleLength/4) ]) cylinder_outer(boltHoleLength + holeCreationOffset,boltHolesRadius,6);
                rotate(a=[0,90,0]) translate([-(baseHeight / 3), -baseWidth/2, -baseWidth - (boltHoleLength/4) ]) cylinder_outer(boltHoleLength + holeCreationOffset,boltHolesRadius,6);
                
                    translate([(facePlateWidth / 3 ), -bracketWidth/2 + (boltHoleLength), (baseHeight )  * .33]) rotate(a=[90,0,0]) cylinder_outer(boltHoleLength* 3 + holeCreationOffset,boltHolesRadius,6);
    
    translate([(facePlateWidth / 3 ), -bracketWidth/2 + (boltHoleLength), -(baseHeight ) * .33]) rotate(a=[90,0,0]) cylinder_outer(boltHoleLength* 3 + holeCreationOffset,boltHolesRadius,6);
                
                    translate([-(facePlateWidth / 3 ), -bracketWidth/2 + (boltHoleLength), -(baseHeight ) * .33]) rotate(a=[90,0,0]) cylinder_outer(boltHoleLength* 3 + holeCreationOffset,boltHolesRadius,6);

    translate([-(facePlateWidth / 3 ), -bracketWidth/2 + (boltHoleLength), (baseHeight )  * .33]) rotate(a=[90,0,0]) cylinder_outer(boltHoleLength* 3 + holeCreationOffset,boltHolesRadius,6);
                
                }
            }   
            
        
}



module drawtext(text) {
	//Characters
	chars = " !\"#$%&'()*+,-./0123456789:;<=>?@ABCDEFGHIJKLMNOPQRSTUVWXYZ[\\]^_`abcdefghijklmnopqrstuvwxyz{|}";

	//Chracter table defining 5x7 characters
	//Adapted from: http://www.geocities.com/dinceraydin/djlcdsim/chartable.js
	char_table = [ [ 0, 0, 0, 0, 0, 0, 0],
                  [ 4, 0, 4, 4, 4, 4, 4],
                  [ 0, 0, 0, 0,10,10,10],
                  [10,10,31,10,31,10,10],
                  [ 4,30, 5,14,20,15, 4],
                  [ 3,19, 8, 4, 2,25,24],
                  [13,18,21, 8,20,18,12],
                  [ 0, 0, 0, 0, 8, 4,12],
                  [ 2, 4, 8, 8, 8, 4, 2],
                  [ 8, 4, 2, 2, 2, 4, 8],
                  [ 0, 4,21,14,21, 4, 0],
                  [ 0, 4, 4,31, 4, 4, 0],
                  [ 8, 4,12, 0, 0, 0, 0],
                  [ 0, 0, 0,31, 0, 0, 0],
                  [12,12, 0, 0, 0, 0, 0],
                  [ 0,16, 8, 4, 2, 1, 0],
                  [14,17,25,21,19,17,14],
                  [14, 4, 4, 4, 4,12, 4],
                  [31, 8, 4, 2, 1,17,14],
                  [14,17, 1, 2, 4, 2,31],
                  [ 2, 2,31,18,10, 6, 2],
                  [14,17, 1, 1,30,16,31],
                  [14,17,17,30,16, 8, 6],
                  [ 8, 8, 8, 4, 2, 1,31],
                  [14,17,17,14,17,17,14],
                  [12, 2, 1,15,17,17,14],
                  [ 0,12,12, 0,12,12, 0],
                  [ 8, 4,12, 0,12,12, 0],
                  [ 2, 4, 8,16, 8, 4, 2],
                  [ 0, 0,31, 0,31, 0, 0],
                  [16, 8, 4, 2, 4, 8,16],
                  [ 4, 0, 4, 2, 1,17,14],
                  [14,21,21,13, 1,17,14],
                  [17,17,31,17,17,17,14],
                  [30,17,17,30,17,17,30],
                  [14,17,16,16,16,17,14],
                  [30,17,17,17,17,17,30],
                  [31,16,16,30,16,16,31],
                  [16,16,16,30,16,16,31],
                  [15,17,17,23,16,17,14],
                  [17,17,17,31,17,17,17],
                  [14, 4, 4, 4, 4, 4,14],
                  [12,18, 2, 2, 2, 2, 7],
                  [17,18,20,24,20,18,17],
                  [31,16,16,16,16,16,16],
                  [17,17,17,21,21,27,17],
                  [17,17,19,21,25,17,17],
                  [14,17,17,17,17,17,14],
                  [16,16,16,30,17,17,30],
                  [13,18,21,17,17,17,14],
                  [17,18,20,30,17,17,30],
                  [30, 1, 1,14,16,16,15],
                  [ 4, 4, 4, 4, 4, 4,31],
                  [14,17,17,17,17,17,17],
                  [ 4,10,17,17,17,17,17],
                  [10,21,21,21,17,17,17],
                  [17,17,10, 4,10,17,17],
                  [ 4, 4, 4,10,17,17,17],
                  [31,16, 8, 4, 2, 1,31],
                  [14, 8, 8, 8, 8, 8,14],
                  [ 0, 1, 2, 4, 8,16, 0],
                  [14, 2, 2, 2, 2, 2,14],
                  [ 0, 0, 0, 0,17,10, 4],
                  [31, 0, 0, 0, 0, 0, 0],
                  [ 0, 0, 0, 0, 2, 4, 8],
                  [15,17,15, 1,14, 0, 0],
                  [30,17,17,25,22,16,16],
                  [14,17,16,16,14, 0, 0],
                  [15,17,17,19,13, 1, 1],
                  [14,16,31,17,14, 0, 0],
                  [ 8, 8, 8,28, 8, 9, 6],
                  [14, 1,15,17,15, 0, 0],
                  [17,17,17,25,22,16,16],
                  [14, 4, 4, 4,12, 0, 4],
                  [12,18, 2, 2, 2, 6, 2],
                  [18,20,24,20,18,16,16],
                  [14, 4, 4, 4, 4, 4,12],
                  [17,17,21,21,26, 0, 0],
                  [17,17,17,25,22, 0, 0],
                  [14,17,17,17,14, 0, 0],
                  [16,16,30,17,30, 0, 0],
                  [ 1, 1,15,19,13, 0, 0],
                  [16,16,16,25,22, 0, 0],
                  [30, 1,14,16,15, 0, 0],
                  [ 6, 9, 8, 8,28, 8, 8],
                  [13,19,17,17,17, 0, 0],
                  [ 4,10,17,17,17, 0, 0],
                  [10,21,21,17,17, 0, 0],
                  [17,10, 4,10,17, 0, 0],
                  [14, 1,15,17,17, 0, 0],
                  [31, 8, 4, 2,31, 0, 0],
                  [ 2, 4, 4, 8, 4, 4, 2],
                  [ 4, 4, 4, 4, 4, 4, 4],
                  [ 8, 4, 4, 2, 4, 4, 8] ];

	//Binary decode table
	dec_table = [ "00000", "00001", "00010", "00011", "00100", "00101",
  	            "00110", "00111", "01000", "01001", "01010", "01011",
  	            "01100", "01101", "01110", "01111", "10000", "10001",
  	            "10010", "10011", "10100", "10101", "10110", "10111",
	            "11000", "11001", "11010", "11011", "11100", "11101",
	            "11110", "11111" ];

	//Process string one character at a time
	for(itext = [0:len(text)-1]) {
		//Convert character to index
		assign(ichar = search(text[itext],chars,1)[0]) {
			//Decode character - rows
			for(irow = [0:6]) {
				assign(val = dec_table[char_table[ichar][irow]]) {
					//Decode character - cols
					for(icol = [0:4]) {
						assign(bit = search(val[icol],"01",1)[0]) {
							if(bit) {
								//Output cube
								translate([icol + (6*itext), irow, 0])
									cube([1.0001,1.0001,1]);
							}
						}
					}
				}
			}
		}
	}
}


holder();
